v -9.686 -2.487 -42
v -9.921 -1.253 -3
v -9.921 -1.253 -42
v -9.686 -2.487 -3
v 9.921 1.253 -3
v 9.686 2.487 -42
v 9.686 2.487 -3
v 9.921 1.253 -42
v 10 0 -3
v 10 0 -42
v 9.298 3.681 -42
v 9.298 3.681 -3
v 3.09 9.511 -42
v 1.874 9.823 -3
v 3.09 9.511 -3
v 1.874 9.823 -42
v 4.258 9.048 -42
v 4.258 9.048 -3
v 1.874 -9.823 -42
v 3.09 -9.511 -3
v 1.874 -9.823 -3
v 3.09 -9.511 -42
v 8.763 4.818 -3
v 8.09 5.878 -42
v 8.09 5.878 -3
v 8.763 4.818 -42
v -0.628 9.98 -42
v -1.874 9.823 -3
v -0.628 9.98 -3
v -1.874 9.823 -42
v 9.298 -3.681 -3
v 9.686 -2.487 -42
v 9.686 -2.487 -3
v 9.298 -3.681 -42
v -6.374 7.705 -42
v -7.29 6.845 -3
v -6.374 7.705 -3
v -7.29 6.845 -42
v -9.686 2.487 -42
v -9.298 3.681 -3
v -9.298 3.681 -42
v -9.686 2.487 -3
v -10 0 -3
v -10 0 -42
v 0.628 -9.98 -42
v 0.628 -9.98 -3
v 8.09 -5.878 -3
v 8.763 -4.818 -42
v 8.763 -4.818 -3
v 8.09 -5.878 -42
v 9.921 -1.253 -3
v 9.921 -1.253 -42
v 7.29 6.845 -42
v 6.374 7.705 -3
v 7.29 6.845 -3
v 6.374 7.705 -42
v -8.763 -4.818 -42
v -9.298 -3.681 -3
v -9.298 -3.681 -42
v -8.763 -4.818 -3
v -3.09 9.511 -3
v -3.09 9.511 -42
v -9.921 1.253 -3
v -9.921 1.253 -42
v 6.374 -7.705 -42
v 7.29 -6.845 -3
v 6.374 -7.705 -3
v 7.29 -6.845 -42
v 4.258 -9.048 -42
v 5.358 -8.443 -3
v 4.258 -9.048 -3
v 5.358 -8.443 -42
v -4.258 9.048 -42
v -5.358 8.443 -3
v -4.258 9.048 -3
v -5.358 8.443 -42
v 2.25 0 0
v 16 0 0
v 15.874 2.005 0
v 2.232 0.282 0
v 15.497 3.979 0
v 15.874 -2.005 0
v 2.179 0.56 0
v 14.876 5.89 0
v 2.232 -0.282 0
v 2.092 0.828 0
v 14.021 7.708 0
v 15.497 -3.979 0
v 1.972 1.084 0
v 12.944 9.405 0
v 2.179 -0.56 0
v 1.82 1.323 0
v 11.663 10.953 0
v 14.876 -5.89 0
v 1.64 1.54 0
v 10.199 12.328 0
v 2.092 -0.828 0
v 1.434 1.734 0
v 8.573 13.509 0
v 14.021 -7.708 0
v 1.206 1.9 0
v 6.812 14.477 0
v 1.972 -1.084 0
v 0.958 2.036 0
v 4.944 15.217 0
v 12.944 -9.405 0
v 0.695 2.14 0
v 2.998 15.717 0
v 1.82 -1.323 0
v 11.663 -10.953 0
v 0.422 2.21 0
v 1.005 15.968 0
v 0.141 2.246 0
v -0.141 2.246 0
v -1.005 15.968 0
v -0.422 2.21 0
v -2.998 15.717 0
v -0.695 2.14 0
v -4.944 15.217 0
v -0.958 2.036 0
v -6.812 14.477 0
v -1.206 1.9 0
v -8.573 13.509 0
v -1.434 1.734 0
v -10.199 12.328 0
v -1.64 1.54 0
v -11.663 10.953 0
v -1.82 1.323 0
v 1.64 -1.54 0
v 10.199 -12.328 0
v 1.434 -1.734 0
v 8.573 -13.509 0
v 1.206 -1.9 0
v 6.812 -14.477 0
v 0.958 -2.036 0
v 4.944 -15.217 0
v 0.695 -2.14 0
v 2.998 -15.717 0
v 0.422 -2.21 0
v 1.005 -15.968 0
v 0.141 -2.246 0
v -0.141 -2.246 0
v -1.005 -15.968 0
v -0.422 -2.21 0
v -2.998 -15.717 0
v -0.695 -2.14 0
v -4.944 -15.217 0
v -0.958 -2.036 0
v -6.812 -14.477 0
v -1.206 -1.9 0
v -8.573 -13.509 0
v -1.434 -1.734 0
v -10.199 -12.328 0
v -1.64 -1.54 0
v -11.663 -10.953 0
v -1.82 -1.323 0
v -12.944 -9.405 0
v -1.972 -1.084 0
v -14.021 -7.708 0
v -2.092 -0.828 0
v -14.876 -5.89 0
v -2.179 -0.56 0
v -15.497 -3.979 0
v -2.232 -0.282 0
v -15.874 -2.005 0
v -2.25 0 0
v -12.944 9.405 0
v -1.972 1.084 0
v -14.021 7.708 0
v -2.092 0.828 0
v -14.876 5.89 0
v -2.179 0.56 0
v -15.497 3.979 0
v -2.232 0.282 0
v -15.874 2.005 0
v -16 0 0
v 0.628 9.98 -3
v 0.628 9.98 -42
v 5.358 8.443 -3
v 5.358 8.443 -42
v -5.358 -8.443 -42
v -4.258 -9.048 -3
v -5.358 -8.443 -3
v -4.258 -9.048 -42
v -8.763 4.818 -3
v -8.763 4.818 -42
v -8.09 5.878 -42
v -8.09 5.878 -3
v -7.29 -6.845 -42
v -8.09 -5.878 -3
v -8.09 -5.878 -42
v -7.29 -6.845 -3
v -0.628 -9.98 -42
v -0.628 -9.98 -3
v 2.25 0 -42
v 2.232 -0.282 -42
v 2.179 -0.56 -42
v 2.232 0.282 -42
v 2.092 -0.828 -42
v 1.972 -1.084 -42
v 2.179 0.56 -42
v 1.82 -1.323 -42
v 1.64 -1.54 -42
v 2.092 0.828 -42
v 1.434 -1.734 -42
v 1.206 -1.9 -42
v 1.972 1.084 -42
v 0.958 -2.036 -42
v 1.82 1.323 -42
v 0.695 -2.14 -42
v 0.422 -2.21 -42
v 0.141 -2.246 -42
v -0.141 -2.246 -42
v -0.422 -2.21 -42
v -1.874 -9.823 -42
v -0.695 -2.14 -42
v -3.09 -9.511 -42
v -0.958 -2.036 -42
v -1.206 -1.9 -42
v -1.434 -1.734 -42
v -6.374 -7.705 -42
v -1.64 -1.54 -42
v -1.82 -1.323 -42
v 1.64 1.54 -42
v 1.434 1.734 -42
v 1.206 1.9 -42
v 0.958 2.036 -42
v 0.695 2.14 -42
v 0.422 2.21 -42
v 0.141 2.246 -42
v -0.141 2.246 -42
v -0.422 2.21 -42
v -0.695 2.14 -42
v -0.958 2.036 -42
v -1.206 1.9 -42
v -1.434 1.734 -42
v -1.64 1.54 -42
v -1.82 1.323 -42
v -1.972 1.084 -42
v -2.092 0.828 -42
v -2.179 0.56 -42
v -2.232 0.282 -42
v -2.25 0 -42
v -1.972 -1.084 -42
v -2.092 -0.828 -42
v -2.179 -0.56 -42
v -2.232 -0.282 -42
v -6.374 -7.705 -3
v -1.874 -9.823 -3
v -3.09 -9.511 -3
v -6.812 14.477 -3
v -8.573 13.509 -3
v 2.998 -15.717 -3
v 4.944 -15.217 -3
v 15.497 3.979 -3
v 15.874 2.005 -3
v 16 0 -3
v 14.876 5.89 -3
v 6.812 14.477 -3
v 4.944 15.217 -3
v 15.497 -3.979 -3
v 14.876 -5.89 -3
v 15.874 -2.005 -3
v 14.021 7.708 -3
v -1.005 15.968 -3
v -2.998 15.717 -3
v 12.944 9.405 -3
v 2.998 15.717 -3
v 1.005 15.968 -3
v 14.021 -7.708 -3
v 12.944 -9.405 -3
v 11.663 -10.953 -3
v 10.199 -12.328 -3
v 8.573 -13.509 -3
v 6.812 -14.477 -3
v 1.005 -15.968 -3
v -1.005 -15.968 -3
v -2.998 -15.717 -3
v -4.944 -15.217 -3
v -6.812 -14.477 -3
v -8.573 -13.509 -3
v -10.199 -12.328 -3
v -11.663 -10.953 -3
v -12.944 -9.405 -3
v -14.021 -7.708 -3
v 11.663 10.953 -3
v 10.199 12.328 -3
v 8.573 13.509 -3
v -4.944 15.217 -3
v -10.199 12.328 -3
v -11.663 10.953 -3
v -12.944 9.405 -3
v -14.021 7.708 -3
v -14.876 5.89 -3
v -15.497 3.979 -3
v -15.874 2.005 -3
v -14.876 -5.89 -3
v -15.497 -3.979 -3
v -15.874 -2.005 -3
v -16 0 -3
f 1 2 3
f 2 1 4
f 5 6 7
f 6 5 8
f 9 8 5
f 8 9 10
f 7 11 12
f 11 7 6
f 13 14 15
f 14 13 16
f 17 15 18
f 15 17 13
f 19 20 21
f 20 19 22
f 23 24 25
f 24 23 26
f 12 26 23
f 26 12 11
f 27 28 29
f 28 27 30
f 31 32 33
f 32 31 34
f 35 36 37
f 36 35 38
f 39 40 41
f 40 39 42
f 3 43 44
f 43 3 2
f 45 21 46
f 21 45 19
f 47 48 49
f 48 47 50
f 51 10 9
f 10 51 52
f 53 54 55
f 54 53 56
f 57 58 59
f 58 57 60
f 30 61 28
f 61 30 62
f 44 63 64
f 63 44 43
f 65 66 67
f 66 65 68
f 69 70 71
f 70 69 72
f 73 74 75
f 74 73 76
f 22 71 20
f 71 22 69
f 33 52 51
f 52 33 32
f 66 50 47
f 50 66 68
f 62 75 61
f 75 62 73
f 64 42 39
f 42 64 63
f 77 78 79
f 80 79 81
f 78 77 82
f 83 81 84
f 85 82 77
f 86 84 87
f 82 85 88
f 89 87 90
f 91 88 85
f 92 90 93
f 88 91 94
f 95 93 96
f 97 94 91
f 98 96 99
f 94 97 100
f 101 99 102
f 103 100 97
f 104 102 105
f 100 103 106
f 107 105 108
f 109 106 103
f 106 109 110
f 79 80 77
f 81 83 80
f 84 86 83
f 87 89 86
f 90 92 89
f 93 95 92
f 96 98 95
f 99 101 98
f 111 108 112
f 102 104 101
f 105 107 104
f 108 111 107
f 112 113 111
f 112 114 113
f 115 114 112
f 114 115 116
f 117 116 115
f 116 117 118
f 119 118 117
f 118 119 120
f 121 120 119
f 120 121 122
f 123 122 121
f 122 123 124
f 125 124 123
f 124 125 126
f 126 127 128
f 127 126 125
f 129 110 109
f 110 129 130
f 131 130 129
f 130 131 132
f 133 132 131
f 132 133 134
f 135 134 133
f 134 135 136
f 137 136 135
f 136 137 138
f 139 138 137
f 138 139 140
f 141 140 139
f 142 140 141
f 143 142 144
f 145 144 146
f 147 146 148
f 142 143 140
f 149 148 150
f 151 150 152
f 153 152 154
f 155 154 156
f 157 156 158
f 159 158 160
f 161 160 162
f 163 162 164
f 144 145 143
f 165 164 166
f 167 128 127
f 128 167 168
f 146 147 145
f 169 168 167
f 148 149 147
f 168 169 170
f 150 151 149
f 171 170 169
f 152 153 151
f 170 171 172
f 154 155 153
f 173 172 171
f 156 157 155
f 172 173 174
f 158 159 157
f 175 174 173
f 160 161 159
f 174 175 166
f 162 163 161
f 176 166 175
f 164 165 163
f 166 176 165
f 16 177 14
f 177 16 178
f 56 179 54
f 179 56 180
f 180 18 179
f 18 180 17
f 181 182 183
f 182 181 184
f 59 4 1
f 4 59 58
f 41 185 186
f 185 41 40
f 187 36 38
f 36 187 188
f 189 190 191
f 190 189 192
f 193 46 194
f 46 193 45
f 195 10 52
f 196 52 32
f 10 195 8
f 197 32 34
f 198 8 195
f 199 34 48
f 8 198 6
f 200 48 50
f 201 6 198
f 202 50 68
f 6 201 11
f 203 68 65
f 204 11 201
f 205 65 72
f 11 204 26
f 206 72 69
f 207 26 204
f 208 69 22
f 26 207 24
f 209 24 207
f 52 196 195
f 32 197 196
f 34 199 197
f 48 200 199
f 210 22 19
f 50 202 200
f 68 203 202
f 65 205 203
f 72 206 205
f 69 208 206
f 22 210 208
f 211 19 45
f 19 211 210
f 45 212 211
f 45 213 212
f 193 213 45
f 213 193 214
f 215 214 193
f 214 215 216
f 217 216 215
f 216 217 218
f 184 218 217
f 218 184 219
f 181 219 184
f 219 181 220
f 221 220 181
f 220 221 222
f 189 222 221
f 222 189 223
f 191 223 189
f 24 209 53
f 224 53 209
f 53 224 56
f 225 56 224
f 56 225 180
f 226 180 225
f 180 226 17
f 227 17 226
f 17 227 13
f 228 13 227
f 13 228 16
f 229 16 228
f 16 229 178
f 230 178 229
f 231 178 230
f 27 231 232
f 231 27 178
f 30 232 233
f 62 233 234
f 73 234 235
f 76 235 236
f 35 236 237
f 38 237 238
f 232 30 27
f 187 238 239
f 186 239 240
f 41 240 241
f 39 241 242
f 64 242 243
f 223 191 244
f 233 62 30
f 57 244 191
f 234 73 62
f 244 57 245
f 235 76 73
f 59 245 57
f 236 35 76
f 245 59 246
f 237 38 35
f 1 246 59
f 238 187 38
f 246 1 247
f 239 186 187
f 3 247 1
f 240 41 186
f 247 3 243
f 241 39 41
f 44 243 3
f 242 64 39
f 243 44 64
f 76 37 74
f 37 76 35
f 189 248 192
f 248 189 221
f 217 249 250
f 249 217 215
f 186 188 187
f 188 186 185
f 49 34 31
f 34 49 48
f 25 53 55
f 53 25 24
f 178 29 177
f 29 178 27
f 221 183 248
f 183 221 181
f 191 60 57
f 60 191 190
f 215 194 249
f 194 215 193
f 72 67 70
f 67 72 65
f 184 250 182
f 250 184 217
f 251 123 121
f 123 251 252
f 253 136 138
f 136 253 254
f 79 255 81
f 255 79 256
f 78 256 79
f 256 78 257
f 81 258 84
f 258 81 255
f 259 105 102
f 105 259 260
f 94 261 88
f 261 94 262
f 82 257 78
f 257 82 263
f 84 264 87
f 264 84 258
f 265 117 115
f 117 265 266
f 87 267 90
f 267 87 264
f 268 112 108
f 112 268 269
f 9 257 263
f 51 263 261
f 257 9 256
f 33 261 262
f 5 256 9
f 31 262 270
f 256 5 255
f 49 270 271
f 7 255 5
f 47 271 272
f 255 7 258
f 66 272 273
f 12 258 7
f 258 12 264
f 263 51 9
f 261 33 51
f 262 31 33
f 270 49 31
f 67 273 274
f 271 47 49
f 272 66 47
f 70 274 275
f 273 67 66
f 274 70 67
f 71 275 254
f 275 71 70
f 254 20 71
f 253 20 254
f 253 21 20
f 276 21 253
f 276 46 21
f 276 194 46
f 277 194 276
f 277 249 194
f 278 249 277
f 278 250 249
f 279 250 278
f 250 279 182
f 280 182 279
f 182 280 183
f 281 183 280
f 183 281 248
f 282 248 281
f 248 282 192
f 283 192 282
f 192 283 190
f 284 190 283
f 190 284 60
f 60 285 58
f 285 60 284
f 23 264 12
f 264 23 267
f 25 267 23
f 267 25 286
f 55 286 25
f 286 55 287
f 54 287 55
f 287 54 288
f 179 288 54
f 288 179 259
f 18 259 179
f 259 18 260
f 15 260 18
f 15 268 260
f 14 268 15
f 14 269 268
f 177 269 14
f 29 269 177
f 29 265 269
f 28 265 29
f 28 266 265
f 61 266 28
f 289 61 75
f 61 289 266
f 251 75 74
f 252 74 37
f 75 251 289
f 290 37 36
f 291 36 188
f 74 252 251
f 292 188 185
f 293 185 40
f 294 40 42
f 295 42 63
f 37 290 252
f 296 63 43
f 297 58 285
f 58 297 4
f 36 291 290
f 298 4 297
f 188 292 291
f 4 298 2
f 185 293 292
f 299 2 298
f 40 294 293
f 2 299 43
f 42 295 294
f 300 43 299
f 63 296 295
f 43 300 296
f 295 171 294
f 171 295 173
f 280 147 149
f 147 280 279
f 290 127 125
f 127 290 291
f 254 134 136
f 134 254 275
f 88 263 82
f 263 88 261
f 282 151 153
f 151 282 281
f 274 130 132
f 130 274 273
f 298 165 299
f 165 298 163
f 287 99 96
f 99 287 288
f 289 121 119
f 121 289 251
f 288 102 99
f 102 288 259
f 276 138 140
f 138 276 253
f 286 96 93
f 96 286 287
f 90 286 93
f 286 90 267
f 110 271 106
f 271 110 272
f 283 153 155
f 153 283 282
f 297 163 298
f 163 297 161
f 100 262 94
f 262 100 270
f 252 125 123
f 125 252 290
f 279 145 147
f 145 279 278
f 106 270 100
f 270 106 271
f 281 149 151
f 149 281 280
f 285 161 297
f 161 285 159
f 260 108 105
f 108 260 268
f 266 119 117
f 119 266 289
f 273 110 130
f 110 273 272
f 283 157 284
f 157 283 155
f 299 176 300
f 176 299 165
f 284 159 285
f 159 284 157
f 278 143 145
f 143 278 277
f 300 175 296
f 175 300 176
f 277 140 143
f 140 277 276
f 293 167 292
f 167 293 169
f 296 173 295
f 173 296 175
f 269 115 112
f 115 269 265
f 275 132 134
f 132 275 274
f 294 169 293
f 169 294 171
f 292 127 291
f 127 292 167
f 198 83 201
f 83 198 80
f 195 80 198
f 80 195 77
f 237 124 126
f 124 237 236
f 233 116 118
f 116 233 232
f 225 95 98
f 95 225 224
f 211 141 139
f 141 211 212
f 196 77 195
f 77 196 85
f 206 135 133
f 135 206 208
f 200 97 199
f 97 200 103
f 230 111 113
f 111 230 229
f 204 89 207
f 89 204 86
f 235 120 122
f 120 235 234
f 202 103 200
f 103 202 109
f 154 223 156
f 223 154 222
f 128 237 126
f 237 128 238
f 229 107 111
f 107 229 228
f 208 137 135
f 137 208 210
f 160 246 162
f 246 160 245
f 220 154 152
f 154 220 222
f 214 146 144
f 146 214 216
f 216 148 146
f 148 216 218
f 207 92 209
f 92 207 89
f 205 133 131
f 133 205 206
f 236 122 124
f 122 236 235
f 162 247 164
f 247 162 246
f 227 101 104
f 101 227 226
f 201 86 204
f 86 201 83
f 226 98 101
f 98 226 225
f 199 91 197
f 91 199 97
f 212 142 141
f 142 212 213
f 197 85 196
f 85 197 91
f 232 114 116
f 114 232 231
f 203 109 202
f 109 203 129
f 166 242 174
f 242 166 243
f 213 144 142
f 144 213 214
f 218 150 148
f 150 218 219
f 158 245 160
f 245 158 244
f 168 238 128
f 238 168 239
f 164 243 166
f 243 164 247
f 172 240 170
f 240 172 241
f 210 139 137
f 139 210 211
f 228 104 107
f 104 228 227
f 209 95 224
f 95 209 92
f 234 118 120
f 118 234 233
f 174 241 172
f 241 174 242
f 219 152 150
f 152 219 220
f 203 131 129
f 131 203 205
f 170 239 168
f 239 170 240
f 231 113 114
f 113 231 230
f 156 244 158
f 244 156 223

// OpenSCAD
$fn = 50;


difference() {
	union() {
		translate(v = [0, 0, -42.0000000000]) {
			cylinder(h = 42, r = 10.0000000000);
		}
		translate(v = [0, 0, -3.0000000000]) {
			cylinder(h = 3, r = 16.0000000000);
		}
	}
	union() {
		#translate(v = [0, 0, -42]) {
			cylinder(h = 42, r = 2.2500000000);
		}
	}
}
